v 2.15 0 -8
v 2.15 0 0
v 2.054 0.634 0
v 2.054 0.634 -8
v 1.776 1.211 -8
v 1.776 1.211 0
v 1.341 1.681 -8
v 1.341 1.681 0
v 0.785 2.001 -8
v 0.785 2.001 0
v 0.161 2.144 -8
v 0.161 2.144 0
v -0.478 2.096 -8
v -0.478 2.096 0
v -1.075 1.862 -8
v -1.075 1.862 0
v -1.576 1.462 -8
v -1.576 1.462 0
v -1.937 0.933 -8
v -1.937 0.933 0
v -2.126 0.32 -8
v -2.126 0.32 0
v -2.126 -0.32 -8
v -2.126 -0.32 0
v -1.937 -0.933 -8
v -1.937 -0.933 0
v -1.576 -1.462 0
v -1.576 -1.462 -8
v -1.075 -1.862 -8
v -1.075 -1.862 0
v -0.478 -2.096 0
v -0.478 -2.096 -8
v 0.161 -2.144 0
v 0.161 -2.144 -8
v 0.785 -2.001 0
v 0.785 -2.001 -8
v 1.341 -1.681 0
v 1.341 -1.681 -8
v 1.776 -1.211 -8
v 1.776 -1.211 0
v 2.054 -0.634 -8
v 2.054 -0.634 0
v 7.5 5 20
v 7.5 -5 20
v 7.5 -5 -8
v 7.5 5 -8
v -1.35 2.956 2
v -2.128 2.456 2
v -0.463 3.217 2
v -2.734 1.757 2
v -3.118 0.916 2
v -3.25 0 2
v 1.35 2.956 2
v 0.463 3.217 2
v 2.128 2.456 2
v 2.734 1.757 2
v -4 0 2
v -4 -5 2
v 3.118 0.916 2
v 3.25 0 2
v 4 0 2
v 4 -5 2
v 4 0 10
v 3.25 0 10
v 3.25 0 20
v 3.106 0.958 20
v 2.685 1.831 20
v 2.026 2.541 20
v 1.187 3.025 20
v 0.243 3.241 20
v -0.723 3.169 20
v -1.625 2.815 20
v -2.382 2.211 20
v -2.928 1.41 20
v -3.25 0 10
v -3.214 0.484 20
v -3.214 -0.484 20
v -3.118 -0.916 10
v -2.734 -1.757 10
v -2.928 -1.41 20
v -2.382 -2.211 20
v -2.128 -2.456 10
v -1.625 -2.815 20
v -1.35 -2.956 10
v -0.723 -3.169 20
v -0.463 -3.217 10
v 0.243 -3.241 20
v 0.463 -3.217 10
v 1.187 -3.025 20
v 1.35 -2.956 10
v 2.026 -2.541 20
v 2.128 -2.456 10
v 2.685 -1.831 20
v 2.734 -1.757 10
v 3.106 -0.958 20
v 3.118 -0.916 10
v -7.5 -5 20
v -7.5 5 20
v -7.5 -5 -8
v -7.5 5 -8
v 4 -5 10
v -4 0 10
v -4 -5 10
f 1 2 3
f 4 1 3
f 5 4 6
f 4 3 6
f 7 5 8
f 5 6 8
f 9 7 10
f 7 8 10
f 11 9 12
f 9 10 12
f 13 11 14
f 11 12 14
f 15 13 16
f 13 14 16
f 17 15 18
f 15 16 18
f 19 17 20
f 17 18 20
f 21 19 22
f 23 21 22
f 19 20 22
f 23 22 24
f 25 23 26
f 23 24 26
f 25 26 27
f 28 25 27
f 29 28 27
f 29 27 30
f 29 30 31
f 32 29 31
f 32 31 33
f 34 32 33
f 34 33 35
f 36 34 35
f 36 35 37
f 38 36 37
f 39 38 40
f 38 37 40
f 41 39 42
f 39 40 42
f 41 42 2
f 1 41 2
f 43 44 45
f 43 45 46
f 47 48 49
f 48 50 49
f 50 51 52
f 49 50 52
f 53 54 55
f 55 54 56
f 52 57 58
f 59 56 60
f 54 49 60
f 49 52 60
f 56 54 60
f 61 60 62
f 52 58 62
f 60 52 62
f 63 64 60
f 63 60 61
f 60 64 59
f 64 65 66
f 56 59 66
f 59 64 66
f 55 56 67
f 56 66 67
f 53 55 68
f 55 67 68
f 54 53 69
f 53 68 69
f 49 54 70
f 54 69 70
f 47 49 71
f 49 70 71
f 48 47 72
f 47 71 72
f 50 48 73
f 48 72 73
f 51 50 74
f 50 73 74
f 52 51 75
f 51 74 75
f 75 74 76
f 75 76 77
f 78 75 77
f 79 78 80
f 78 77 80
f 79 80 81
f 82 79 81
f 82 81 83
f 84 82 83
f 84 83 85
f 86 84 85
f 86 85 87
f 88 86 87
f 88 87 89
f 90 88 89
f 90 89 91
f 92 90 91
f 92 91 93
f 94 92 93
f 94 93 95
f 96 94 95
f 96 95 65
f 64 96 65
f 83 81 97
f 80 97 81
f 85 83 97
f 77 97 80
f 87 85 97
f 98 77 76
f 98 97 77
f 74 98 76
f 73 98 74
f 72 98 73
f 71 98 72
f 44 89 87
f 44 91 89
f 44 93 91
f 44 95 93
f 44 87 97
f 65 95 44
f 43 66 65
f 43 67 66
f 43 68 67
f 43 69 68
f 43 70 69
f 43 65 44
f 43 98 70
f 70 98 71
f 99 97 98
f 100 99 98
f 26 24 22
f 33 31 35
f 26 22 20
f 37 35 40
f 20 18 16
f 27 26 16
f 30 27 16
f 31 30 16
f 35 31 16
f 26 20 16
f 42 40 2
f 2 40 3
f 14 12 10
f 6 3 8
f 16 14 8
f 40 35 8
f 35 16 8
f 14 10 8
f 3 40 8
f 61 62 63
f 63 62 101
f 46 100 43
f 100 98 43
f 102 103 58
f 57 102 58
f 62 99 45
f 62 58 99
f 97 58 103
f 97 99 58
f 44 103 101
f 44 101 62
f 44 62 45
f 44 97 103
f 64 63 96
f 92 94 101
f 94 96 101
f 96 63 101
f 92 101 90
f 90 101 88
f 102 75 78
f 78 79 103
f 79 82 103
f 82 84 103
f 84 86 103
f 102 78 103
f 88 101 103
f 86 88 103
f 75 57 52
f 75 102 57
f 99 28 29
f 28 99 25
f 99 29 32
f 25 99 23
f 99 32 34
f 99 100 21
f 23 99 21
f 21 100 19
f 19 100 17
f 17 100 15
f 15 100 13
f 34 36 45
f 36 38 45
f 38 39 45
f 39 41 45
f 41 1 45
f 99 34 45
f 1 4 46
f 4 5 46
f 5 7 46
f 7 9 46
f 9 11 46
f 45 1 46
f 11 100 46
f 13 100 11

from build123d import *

# Parameters (mm, degrees)
F0_R     = 3
F0_R_2   = 2.15
F1_DEPTH = 8
F2_W     = 15
F2_H     = 10
F3_DEPTH = 20
F4_R     = 3.25
F6_DEPTH = 18
F7_DEPTH = 5
F8_DEPTH = 8


with BuildPart() as f1:
    # F0 (on Top) → F1 (new body)
    with BuildSketch(Plane.XY):
        Circle(F0_R)
        Circle(F0_R_2, mode=Mode.SUBTRACT)
    extrude(amount=-F1_DEPTH)

    # F2 (on face) → F3 (join)
    with BuildSketch(Plane.XY):
        Rectangle(F2_W, F2_H)
    extrude(amount=F3_DEPTH)

    # F4 (on face) → F6 (cut)
    with BuildSketch(Plane.XY.offset(20)):
        Circle(F4_R)
    extrude(amount=-F6_DEPTH, mode=Mode.SUBTRACT)

    # F5 (on face) → F7 (cut)
    with BuildSketch(Plane.XZ.offset(5)):
        Polygon((-4, 2), (0, 2), (4, 2), (4, 10), (0, 10), (-4, 10), align=None)
    extrude(amount=-F7_DEPTH, mode=Mode.SUBTRACT)

    # F8 (add): a face of the model
    f8_faces = [f1.faces().sort_by_distance(p)[0] for p in [
        (7.3197224362, 0, 0),
    ]]
    extrude(f8_faces, amount=F8_DEPTH)


solid = f1.part
